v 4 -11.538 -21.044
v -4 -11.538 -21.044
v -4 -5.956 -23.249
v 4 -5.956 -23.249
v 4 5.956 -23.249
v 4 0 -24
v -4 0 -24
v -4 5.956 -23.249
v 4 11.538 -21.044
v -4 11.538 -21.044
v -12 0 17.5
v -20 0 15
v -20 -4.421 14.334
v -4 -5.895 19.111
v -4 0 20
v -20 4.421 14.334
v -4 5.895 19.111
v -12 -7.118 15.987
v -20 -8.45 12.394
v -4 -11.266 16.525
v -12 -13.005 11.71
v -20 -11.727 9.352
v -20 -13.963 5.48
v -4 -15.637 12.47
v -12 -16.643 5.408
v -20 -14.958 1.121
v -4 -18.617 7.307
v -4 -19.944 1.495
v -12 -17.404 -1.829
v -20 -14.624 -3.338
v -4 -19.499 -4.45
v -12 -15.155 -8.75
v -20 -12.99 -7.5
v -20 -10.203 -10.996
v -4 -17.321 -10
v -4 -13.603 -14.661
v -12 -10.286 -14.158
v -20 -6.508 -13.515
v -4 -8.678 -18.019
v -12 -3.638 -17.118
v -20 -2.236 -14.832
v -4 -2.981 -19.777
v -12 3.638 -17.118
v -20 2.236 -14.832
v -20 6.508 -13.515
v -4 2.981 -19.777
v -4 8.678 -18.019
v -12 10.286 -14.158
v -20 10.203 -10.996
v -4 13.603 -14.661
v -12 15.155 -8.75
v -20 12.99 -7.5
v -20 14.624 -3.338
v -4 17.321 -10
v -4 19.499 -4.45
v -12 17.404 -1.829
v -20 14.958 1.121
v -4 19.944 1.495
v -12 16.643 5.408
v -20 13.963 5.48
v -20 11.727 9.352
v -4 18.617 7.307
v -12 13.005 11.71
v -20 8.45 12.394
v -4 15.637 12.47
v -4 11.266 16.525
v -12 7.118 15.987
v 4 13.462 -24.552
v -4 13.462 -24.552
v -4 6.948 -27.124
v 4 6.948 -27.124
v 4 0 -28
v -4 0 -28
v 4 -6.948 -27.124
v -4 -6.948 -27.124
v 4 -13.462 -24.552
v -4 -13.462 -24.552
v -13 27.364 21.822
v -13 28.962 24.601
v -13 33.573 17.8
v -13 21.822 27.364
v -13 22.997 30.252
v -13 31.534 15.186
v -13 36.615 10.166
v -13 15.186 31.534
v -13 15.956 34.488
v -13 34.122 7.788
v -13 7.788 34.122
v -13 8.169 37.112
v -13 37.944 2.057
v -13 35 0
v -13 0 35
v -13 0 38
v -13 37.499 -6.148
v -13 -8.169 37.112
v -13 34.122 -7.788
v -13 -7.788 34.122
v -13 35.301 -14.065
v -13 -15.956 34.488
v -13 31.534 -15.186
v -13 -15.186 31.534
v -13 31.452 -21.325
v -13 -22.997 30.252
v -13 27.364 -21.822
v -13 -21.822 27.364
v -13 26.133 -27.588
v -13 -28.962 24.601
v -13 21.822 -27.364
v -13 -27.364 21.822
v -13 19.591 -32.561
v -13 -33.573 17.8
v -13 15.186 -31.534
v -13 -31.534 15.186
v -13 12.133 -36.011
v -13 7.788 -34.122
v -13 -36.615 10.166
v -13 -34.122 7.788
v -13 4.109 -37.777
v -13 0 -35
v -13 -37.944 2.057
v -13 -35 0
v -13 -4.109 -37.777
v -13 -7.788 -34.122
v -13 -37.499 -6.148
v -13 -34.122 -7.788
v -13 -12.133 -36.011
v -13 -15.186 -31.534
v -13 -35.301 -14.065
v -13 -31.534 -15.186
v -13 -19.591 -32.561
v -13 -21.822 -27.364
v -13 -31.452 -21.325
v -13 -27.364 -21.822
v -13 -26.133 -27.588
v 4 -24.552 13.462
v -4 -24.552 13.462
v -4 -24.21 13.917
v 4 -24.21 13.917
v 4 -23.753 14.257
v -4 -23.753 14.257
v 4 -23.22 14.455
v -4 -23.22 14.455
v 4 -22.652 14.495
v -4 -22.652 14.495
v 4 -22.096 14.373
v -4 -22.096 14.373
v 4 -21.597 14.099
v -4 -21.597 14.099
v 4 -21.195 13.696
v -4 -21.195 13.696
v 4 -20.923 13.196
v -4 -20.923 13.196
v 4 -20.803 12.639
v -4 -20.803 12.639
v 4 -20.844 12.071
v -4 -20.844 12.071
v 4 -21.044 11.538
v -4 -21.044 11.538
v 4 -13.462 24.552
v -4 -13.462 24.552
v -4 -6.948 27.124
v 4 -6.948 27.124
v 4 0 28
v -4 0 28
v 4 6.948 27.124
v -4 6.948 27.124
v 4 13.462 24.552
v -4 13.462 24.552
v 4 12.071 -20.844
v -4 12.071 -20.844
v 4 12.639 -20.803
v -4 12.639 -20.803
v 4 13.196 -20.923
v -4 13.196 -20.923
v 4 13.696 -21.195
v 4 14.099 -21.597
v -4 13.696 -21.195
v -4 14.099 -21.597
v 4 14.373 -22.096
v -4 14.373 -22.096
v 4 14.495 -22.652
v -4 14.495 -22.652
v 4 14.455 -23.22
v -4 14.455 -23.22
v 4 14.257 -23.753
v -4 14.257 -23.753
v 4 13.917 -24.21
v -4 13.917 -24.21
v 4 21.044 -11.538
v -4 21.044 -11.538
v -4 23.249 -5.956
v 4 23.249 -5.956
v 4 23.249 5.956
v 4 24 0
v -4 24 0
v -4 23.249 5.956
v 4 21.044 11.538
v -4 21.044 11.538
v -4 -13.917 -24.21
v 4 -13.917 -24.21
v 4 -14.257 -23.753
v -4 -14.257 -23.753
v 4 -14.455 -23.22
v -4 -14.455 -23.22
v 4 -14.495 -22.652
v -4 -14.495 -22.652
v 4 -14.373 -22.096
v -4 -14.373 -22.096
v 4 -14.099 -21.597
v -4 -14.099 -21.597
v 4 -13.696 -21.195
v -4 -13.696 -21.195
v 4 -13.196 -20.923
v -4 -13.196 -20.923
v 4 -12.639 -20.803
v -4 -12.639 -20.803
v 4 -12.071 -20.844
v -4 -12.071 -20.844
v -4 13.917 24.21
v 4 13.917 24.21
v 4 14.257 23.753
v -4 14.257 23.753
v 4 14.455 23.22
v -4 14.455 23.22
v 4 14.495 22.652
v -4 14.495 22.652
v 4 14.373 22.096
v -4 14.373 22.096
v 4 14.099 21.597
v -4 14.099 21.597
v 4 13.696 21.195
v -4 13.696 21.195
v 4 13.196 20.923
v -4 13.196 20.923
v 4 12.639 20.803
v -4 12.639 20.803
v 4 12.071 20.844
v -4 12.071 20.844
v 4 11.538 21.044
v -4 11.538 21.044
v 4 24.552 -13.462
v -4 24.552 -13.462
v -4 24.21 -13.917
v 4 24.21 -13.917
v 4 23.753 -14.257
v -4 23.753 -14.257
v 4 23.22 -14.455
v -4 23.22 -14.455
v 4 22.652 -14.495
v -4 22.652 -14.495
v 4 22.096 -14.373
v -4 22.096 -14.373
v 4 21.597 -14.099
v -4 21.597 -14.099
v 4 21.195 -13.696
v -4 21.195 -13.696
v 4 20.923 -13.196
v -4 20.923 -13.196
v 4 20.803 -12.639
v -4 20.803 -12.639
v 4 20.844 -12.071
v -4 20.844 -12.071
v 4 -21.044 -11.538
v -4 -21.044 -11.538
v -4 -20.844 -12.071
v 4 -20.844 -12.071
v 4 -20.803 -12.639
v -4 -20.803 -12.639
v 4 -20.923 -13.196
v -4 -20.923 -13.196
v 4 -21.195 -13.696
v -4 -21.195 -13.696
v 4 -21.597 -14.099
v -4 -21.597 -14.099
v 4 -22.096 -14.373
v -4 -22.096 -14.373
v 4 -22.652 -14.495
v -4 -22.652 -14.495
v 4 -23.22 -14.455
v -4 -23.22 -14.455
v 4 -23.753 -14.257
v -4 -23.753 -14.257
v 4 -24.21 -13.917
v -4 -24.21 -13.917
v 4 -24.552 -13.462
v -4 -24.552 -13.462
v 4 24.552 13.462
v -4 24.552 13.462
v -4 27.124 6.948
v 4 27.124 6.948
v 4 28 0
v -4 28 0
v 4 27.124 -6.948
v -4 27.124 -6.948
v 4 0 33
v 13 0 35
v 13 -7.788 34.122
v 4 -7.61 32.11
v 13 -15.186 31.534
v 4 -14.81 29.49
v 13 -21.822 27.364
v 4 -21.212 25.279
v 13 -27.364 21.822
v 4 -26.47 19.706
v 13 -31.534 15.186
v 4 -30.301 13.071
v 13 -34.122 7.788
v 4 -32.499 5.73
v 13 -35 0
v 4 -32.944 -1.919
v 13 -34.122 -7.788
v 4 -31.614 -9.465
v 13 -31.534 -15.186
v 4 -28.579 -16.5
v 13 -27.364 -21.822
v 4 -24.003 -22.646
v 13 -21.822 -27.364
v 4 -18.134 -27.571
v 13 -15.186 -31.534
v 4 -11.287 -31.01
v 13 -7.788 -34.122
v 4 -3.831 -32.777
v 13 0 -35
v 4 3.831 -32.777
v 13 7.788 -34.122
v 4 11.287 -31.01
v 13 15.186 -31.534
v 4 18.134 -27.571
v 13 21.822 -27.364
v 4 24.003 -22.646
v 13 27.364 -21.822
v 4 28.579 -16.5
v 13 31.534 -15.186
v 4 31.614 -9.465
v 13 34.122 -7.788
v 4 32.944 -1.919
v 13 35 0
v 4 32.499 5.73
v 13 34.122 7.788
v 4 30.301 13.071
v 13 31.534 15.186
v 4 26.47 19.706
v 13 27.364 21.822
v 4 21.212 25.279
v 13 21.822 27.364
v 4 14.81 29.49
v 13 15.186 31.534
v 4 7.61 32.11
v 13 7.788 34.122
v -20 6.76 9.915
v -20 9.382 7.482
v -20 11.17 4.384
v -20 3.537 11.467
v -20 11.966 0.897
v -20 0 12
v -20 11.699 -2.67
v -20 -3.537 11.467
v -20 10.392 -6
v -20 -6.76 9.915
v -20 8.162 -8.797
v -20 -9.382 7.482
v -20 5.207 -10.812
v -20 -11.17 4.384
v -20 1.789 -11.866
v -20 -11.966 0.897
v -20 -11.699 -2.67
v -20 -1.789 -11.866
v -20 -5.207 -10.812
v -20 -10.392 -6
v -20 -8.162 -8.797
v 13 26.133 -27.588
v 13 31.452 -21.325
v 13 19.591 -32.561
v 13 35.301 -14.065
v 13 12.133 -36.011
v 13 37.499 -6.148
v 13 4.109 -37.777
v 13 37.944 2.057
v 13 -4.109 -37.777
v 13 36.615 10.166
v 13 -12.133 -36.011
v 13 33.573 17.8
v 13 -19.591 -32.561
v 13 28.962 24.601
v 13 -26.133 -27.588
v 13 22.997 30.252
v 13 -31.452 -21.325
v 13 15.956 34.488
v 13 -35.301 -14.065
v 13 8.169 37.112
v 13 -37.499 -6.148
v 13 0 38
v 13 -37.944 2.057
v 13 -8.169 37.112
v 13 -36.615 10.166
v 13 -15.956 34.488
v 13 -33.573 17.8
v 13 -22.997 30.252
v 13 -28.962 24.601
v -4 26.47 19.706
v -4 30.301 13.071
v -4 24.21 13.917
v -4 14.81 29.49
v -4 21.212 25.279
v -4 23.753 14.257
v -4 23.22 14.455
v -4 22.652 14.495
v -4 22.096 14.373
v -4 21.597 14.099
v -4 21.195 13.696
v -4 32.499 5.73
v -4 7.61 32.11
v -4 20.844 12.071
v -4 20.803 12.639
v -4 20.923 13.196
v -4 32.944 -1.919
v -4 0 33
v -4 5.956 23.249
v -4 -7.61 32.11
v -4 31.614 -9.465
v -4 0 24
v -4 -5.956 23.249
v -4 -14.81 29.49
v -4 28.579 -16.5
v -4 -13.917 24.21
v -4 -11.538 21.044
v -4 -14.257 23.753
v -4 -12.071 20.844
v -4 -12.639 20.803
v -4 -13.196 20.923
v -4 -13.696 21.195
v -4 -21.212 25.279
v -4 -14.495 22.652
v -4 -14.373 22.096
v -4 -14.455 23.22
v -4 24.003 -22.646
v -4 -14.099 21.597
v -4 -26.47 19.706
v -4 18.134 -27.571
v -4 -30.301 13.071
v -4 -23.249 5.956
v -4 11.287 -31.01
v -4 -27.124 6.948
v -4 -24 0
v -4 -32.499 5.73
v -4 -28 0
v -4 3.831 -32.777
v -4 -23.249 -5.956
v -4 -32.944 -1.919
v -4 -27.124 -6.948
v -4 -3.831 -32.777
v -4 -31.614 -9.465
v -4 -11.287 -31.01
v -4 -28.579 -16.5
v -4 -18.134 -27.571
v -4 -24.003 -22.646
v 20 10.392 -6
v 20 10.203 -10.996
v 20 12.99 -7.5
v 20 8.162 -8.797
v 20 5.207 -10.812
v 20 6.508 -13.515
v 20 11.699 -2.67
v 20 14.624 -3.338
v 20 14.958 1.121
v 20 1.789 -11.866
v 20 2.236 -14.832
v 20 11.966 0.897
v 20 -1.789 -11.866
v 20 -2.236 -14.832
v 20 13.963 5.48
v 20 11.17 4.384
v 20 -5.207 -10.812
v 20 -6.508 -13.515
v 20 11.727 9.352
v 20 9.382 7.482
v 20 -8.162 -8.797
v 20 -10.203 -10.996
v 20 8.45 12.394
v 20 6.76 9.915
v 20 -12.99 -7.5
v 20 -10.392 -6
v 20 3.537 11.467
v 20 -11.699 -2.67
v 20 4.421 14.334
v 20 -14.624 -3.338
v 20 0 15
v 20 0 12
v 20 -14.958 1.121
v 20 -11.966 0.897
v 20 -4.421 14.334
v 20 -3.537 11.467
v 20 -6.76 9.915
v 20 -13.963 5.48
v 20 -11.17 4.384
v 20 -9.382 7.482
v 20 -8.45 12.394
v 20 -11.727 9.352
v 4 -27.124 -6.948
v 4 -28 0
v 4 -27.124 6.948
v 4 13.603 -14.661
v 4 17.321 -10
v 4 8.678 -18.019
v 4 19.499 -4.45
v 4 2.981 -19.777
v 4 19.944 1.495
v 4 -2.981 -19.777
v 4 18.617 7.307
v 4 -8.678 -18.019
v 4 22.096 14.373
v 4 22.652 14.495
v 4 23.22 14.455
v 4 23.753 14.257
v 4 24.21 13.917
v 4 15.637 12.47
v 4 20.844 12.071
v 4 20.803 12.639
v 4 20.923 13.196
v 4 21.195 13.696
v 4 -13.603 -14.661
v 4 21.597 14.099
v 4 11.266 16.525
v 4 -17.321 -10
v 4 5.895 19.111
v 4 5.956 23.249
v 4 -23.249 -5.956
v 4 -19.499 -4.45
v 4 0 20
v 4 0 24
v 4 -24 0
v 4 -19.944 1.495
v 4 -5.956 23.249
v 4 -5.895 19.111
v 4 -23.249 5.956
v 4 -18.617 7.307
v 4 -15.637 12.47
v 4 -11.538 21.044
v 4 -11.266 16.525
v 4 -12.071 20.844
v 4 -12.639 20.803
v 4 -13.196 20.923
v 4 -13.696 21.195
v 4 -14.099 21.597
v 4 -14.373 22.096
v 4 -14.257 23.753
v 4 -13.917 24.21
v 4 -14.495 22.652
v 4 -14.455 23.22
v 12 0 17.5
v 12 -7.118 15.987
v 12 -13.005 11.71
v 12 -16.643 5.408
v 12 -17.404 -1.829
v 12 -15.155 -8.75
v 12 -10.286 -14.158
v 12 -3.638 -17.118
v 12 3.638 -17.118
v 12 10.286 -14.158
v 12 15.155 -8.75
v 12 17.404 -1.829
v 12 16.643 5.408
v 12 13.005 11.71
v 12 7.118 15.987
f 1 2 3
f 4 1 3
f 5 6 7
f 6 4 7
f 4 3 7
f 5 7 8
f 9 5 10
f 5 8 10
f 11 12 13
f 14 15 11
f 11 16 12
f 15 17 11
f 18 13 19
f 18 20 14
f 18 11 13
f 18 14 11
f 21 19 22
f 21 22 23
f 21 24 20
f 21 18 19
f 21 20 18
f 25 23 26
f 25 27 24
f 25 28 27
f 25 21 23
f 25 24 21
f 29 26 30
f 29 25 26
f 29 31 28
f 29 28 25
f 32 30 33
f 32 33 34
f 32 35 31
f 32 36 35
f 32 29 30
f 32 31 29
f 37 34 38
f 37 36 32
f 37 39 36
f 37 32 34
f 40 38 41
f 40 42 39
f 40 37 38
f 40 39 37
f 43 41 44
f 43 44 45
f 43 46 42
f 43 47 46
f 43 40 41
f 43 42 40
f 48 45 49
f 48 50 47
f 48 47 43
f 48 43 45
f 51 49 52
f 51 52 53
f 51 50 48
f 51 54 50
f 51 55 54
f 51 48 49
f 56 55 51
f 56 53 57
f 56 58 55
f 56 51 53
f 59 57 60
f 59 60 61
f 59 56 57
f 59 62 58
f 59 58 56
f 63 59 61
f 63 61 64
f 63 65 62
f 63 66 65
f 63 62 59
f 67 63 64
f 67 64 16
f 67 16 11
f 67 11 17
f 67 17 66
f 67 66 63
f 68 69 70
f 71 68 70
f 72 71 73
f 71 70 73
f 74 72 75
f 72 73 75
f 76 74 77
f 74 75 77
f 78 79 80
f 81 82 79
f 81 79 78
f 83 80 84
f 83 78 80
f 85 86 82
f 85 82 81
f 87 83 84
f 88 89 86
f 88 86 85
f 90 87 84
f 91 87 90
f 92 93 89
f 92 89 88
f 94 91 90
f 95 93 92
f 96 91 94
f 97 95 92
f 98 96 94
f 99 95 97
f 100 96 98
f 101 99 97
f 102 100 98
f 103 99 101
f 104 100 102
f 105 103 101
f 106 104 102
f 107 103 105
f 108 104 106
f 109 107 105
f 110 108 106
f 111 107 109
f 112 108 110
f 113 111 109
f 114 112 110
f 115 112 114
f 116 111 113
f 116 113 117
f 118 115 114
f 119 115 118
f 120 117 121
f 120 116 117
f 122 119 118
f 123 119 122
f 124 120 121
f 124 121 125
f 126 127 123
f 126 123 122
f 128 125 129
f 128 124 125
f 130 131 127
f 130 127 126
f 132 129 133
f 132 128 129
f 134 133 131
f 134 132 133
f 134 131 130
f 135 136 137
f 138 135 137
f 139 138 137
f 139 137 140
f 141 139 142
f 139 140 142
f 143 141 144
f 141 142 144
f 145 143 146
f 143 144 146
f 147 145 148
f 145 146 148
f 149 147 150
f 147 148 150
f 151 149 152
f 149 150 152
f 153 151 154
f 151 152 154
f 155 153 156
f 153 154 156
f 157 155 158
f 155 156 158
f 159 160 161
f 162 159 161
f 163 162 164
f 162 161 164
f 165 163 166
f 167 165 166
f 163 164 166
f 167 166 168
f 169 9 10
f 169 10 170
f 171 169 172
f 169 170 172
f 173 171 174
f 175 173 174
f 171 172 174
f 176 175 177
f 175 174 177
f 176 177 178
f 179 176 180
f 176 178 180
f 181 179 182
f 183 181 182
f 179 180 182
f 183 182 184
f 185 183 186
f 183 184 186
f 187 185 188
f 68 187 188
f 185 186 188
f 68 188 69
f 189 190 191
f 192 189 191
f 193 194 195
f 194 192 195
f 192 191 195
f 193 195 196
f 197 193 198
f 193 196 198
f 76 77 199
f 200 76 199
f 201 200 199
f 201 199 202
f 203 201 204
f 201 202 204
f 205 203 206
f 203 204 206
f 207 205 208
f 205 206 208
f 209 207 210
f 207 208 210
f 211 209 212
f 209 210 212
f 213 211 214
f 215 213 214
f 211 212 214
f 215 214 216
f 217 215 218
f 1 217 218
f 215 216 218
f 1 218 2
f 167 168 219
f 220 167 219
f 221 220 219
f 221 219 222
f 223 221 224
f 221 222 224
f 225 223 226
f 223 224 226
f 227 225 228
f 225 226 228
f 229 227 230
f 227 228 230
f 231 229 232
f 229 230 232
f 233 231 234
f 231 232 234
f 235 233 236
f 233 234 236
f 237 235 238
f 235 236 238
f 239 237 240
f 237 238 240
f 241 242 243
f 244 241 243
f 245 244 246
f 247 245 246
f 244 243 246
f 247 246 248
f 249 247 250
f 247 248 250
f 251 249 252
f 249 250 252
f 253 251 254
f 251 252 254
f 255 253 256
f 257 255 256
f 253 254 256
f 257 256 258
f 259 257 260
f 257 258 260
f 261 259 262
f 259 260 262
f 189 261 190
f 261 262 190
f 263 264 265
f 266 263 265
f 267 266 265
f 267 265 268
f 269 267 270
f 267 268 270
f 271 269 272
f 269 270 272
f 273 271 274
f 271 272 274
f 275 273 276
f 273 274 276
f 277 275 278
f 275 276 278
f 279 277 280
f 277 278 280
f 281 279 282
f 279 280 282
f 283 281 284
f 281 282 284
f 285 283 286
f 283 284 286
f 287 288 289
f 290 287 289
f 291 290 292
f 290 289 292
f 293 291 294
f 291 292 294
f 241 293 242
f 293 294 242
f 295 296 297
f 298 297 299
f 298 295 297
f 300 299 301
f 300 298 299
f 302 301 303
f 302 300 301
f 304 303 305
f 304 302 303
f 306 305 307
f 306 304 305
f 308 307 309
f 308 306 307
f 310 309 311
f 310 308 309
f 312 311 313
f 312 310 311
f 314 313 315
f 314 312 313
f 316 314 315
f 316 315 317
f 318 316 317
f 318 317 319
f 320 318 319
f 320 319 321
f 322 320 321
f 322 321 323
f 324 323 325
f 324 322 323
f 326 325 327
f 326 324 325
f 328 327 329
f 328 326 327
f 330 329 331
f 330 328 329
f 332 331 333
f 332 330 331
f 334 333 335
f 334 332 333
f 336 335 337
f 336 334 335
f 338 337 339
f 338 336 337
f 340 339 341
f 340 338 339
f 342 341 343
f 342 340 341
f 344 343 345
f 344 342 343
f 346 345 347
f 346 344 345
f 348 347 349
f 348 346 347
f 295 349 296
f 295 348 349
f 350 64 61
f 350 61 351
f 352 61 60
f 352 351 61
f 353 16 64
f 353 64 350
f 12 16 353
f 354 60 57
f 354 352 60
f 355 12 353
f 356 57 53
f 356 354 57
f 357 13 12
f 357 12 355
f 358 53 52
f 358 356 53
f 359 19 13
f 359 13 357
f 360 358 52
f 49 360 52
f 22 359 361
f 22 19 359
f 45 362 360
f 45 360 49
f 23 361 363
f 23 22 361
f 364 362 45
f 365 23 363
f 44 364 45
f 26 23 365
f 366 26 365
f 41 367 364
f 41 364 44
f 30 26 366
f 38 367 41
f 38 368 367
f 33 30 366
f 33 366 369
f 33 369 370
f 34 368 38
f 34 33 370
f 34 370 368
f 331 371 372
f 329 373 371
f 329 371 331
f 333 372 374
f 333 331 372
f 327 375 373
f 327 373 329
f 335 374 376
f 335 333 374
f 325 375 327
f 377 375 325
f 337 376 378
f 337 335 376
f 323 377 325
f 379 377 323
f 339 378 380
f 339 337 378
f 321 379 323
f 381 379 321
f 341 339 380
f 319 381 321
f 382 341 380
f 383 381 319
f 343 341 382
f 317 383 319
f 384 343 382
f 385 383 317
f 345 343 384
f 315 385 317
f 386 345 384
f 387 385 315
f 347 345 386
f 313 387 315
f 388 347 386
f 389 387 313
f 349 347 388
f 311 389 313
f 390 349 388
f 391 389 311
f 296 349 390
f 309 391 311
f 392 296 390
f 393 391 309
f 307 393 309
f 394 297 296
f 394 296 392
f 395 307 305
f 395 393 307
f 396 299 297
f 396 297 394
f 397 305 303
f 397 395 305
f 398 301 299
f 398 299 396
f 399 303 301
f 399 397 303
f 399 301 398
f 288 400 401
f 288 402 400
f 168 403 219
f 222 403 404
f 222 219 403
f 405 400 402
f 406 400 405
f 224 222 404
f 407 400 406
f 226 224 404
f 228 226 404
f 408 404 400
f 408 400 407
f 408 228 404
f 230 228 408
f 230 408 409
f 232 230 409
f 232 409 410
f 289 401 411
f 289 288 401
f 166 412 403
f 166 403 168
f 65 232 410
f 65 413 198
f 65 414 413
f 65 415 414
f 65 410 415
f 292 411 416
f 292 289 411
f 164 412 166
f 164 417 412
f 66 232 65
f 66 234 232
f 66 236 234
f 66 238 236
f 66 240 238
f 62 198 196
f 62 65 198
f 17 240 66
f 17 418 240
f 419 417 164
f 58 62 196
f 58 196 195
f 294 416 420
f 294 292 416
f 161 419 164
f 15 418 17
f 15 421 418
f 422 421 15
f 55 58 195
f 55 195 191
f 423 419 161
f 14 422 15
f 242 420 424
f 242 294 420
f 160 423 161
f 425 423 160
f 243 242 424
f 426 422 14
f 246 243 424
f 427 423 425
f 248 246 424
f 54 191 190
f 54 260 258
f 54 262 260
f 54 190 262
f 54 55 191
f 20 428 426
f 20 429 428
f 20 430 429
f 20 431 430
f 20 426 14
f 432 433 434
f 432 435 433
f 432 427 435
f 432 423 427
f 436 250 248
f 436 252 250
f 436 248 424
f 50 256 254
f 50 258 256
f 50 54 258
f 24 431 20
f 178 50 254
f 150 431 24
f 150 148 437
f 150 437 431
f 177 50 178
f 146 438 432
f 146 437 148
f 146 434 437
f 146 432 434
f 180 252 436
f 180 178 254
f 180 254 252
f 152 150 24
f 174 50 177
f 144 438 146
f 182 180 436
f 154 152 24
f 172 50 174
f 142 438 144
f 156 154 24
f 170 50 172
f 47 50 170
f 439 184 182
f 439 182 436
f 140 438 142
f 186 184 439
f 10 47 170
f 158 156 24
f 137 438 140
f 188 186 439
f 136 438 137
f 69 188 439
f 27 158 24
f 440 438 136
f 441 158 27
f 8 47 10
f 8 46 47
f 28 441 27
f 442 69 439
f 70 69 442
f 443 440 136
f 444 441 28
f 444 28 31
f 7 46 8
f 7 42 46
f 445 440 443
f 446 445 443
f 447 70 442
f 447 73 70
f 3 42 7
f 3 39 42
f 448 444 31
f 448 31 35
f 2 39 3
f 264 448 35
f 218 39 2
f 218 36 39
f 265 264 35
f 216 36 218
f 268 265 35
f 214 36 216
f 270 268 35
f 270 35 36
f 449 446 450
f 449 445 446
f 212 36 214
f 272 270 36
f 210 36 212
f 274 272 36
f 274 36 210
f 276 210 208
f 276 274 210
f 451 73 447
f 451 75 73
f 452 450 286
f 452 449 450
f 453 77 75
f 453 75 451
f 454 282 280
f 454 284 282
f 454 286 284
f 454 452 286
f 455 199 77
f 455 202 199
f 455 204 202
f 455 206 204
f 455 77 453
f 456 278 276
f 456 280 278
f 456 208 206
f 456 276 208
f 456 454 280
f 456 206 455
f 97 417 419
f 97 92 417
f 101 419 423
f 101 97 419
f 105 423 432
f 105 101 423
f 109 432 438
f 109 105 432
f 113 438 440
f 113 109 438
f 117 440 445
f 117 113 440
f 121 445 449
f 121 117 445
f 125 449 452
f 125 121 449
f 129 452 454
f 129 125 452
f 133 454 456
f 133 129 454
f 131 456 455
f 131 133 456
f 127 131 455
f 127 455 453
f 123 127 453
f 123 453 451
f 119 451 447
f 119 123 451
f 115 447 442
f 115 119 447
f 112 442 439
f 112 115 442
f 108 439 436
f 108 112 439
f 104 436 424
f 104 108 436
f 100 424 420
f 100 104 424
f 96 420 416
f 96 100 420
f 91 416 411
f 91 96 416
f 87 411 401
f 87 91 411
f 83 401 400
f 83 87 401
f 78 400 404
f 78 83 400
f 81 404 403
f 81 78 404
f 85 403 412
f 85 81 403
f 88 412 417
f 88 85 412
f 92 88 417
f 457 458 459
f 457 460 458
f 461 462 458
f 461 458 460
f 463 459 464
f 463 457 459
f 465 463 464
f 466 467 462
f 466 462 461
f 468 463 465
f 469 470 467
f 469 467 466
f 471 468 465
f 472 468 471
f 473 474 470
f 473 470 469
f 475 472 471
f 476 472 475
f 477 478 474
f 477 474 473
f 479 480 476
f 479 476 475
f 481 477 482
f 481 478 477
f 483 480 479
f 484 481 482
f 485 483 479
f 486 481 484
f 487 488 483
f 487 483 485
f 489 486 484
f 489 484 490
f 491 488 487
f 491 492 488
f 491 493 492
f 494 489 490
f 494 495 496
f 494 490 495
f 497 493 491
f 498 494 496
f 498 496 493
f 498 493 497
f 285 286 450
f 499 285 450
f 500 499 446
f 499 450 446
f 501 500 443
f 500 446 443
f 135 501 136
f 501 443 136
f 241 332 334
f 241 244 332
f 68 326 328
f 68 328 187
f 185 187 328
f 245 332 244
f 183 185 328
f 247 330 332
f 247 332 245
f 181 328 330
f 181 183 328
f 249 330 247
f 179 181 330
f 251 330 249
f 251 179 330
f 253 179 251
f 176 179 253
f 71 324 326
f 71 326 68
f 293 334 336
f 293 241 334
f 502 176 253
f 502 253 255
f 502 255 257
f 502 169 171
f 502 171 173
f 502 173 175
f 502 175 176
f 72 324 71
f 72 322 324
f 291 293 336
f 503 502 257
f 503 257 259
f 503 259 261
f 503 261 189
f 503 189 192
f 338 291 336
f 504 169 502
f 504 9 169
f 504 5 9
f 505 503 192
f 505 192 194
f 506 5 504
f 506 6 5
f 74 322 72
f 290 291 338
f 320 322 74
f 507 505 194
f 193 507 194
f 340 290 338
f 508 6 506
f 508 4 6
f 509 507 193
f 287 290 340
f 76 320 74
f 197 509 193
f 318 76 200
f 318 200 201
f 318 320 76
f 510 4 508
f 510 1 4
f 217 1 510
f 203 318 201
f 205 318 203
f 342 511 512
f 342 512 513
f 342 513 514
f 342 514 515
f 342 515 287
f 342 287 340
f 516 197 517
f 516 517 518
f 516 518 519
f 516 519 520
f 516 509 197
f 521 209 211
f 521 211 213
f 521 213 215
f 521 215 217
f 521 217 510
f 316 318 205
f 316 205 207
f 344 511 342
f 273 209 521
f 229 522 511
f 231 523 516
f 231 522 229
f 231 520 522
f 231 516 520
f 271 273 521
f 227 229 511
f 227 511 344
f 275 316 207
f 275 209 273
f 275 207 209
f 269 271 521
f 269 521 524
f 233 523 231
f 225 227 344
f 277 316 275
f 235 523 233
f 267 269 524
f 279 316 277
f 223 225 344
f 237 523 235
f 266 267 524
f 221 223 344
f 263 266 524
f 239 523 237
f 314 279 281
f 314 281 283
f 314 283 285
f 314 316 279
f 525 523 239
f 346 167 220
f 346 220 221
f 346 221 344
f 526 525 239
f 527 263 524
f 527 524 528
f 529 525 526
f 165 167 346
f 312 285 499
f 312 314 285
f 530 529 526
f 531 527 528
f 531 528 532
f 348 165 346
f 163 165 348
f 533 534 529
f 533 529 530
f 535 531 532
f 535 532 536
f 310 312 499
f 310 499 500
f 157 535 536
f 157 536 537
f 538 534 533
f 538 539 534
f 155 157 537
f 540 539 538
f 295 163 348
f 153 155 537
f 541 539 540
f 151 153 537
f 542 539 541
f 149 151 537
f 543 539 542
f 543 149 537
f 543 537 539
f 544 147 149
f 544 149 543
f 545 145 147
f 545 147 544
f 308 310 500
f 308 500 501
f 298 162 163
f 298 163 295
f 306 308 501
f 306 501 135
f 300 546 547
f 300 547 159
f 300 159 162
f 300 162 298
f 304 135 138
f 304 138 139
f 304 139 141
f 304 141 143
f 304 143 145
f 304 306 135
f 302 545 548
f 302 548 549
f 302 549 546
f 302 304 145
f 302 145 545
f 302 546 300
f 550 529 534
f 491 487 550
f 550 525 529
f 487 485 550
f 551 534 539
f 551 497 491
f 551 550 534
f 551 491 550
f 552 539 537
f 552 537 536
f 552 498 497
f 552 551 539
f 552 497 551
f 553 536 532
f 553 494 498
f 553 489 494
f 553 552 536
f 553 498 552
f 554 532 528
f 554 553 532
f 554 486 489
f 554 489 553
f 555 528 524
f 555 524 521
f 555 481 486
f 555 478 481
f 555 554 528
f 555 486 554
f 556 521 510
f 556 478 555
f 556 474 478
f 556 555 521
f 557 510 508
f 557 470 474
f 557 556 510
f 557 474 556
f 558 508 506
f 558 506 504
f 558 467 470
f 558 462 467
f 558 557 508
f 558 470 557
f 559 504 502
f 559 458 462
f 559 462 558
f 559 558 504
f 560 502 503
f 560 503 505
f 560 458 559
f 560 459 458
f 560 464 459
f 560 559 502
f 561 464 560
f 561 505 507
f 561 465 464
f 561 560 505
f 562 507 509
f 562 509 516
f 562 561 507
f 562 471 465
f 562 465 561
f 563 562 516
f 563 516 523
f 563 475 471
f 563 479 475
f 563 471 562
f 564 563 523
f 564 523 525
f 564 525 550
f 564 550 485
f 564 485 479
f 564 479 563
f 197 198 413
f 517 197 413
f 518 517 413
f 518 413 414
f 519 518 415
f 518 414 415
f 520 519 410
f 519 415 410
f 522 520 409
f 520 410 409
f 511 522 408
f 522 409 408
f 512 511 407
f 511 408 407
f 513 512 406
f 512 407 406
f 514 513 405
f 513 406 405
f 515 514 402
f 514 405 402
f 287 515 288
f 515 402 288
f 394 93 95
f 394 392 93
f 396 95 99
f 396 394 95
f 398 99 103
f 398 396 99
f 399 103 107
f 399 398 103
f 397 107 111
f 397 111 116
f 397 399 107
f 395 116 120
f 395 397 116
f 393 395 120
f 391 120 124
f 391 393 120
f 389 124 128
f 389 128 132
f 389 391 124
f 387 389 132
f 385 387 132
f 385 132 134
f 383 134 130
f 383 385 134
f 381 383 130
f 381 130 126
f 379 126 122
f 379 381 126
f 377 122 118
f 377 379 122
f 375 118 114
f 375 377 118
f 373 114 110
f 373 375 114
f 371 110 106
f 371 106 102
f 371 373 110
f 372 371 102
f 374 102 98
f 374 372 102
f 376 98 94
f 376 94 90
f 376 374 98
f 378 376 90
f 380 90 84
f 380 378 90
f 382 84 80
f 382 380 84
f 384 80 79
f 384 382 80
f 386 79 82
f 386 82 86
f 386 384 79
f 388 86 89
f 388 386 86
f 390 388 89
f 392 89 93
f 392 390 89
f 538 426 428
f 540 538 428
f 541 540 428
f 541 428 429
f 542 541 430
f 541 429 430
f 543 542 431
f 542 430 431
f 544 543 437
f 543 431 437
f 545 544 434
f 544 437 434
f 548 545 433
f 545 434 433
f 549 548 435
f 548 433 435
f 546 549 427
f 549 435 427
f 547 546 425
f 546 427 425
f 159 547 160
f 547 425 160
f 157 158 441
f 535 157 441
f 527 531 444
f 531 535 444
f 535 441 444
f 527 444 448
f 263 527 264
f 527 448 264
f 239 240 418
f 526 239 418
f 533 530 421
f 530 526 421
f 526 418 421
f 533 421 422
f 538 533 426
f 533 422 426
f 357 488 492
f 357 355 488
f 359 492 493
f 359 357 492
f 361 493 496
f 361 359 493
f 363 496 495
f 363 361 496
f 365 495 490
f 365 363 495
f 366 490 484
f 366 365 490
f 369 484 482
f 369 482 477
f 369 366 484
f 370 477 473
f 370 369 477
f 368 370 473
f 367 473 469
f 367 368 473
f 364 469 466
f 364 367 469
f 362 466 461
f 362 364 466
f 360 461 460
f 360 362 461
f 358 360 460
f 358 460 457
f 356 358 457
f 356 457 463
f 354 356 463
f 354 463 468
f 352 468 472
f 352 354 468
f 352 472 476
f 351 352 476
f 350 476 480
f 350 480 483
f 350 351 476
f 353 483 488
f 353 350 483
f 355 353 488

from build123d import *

# Parameters (mm, degrees)
CUT_EXTRUDE1_DEPTH = 59.855755878
CIRPATTERN1_COUNT  = 4


with BuildPart() as part:
    # Sketch1 → Revolve1 (revolve)
    with BuildSketch(Plane.XY, mode=Mode.PRIVATE) as revolve1_sk:
        Polygon((-13, 38), (13, 38), (13, 35), (4, 33), (4, 20), (20, 15), (20, 12), (-20, 12), (-20, 15), (-4, 20), (-4, 33), (-13, 35), align=None)
    revolve(revolve1_sk.sketch.rotate(Axis((0, 0, 0), (1, 0, 0)), 90), axis=Axis((0, 0, 0), (1, 0, 0)))

    # Sketch2 → Cut-Extrude1 (cut, symmetric)
    with BuildSketch(Plane.ZY.offset(4)):
        with BuildLine():
            ThreePointArc((13.461538462, 24.551720556), (0, 28), (-13.461538462, 24.551720556))
            ThreePointArc((-13.461538462, 24.551720556), (-14.253694325, 21.836487769), (-11.538461538, 21.044331905))
            ThreePointArc((-11.538461538, 21.044331905), (0, 24), (11.538461538, 21.044331905))
            ThreePointArc((11.538461538, 21.044331905), (14.253694325, 21.836487769), (13.461538462, 24.551720556))
        make_face()
    cut_extrude1 = extrude(amount=CUT_EXTRUDE1_DEPTH, both=True, mode=Mode.SUBTRACT)

    # CirPattern1: Cut-Extrude1 ×4 about axis
    cirpattern1_axis = Axis((0, 0, 0), (1, 0, 0))
    for i in range(1, CIRPATTERN1_COUNT):
        add(cut_extrude1.rotate(cirpattern1_axis, i * 360 / CIRPATTERN1_COUNT), mode=Mode.SUBTRACT)


solid = part.part
